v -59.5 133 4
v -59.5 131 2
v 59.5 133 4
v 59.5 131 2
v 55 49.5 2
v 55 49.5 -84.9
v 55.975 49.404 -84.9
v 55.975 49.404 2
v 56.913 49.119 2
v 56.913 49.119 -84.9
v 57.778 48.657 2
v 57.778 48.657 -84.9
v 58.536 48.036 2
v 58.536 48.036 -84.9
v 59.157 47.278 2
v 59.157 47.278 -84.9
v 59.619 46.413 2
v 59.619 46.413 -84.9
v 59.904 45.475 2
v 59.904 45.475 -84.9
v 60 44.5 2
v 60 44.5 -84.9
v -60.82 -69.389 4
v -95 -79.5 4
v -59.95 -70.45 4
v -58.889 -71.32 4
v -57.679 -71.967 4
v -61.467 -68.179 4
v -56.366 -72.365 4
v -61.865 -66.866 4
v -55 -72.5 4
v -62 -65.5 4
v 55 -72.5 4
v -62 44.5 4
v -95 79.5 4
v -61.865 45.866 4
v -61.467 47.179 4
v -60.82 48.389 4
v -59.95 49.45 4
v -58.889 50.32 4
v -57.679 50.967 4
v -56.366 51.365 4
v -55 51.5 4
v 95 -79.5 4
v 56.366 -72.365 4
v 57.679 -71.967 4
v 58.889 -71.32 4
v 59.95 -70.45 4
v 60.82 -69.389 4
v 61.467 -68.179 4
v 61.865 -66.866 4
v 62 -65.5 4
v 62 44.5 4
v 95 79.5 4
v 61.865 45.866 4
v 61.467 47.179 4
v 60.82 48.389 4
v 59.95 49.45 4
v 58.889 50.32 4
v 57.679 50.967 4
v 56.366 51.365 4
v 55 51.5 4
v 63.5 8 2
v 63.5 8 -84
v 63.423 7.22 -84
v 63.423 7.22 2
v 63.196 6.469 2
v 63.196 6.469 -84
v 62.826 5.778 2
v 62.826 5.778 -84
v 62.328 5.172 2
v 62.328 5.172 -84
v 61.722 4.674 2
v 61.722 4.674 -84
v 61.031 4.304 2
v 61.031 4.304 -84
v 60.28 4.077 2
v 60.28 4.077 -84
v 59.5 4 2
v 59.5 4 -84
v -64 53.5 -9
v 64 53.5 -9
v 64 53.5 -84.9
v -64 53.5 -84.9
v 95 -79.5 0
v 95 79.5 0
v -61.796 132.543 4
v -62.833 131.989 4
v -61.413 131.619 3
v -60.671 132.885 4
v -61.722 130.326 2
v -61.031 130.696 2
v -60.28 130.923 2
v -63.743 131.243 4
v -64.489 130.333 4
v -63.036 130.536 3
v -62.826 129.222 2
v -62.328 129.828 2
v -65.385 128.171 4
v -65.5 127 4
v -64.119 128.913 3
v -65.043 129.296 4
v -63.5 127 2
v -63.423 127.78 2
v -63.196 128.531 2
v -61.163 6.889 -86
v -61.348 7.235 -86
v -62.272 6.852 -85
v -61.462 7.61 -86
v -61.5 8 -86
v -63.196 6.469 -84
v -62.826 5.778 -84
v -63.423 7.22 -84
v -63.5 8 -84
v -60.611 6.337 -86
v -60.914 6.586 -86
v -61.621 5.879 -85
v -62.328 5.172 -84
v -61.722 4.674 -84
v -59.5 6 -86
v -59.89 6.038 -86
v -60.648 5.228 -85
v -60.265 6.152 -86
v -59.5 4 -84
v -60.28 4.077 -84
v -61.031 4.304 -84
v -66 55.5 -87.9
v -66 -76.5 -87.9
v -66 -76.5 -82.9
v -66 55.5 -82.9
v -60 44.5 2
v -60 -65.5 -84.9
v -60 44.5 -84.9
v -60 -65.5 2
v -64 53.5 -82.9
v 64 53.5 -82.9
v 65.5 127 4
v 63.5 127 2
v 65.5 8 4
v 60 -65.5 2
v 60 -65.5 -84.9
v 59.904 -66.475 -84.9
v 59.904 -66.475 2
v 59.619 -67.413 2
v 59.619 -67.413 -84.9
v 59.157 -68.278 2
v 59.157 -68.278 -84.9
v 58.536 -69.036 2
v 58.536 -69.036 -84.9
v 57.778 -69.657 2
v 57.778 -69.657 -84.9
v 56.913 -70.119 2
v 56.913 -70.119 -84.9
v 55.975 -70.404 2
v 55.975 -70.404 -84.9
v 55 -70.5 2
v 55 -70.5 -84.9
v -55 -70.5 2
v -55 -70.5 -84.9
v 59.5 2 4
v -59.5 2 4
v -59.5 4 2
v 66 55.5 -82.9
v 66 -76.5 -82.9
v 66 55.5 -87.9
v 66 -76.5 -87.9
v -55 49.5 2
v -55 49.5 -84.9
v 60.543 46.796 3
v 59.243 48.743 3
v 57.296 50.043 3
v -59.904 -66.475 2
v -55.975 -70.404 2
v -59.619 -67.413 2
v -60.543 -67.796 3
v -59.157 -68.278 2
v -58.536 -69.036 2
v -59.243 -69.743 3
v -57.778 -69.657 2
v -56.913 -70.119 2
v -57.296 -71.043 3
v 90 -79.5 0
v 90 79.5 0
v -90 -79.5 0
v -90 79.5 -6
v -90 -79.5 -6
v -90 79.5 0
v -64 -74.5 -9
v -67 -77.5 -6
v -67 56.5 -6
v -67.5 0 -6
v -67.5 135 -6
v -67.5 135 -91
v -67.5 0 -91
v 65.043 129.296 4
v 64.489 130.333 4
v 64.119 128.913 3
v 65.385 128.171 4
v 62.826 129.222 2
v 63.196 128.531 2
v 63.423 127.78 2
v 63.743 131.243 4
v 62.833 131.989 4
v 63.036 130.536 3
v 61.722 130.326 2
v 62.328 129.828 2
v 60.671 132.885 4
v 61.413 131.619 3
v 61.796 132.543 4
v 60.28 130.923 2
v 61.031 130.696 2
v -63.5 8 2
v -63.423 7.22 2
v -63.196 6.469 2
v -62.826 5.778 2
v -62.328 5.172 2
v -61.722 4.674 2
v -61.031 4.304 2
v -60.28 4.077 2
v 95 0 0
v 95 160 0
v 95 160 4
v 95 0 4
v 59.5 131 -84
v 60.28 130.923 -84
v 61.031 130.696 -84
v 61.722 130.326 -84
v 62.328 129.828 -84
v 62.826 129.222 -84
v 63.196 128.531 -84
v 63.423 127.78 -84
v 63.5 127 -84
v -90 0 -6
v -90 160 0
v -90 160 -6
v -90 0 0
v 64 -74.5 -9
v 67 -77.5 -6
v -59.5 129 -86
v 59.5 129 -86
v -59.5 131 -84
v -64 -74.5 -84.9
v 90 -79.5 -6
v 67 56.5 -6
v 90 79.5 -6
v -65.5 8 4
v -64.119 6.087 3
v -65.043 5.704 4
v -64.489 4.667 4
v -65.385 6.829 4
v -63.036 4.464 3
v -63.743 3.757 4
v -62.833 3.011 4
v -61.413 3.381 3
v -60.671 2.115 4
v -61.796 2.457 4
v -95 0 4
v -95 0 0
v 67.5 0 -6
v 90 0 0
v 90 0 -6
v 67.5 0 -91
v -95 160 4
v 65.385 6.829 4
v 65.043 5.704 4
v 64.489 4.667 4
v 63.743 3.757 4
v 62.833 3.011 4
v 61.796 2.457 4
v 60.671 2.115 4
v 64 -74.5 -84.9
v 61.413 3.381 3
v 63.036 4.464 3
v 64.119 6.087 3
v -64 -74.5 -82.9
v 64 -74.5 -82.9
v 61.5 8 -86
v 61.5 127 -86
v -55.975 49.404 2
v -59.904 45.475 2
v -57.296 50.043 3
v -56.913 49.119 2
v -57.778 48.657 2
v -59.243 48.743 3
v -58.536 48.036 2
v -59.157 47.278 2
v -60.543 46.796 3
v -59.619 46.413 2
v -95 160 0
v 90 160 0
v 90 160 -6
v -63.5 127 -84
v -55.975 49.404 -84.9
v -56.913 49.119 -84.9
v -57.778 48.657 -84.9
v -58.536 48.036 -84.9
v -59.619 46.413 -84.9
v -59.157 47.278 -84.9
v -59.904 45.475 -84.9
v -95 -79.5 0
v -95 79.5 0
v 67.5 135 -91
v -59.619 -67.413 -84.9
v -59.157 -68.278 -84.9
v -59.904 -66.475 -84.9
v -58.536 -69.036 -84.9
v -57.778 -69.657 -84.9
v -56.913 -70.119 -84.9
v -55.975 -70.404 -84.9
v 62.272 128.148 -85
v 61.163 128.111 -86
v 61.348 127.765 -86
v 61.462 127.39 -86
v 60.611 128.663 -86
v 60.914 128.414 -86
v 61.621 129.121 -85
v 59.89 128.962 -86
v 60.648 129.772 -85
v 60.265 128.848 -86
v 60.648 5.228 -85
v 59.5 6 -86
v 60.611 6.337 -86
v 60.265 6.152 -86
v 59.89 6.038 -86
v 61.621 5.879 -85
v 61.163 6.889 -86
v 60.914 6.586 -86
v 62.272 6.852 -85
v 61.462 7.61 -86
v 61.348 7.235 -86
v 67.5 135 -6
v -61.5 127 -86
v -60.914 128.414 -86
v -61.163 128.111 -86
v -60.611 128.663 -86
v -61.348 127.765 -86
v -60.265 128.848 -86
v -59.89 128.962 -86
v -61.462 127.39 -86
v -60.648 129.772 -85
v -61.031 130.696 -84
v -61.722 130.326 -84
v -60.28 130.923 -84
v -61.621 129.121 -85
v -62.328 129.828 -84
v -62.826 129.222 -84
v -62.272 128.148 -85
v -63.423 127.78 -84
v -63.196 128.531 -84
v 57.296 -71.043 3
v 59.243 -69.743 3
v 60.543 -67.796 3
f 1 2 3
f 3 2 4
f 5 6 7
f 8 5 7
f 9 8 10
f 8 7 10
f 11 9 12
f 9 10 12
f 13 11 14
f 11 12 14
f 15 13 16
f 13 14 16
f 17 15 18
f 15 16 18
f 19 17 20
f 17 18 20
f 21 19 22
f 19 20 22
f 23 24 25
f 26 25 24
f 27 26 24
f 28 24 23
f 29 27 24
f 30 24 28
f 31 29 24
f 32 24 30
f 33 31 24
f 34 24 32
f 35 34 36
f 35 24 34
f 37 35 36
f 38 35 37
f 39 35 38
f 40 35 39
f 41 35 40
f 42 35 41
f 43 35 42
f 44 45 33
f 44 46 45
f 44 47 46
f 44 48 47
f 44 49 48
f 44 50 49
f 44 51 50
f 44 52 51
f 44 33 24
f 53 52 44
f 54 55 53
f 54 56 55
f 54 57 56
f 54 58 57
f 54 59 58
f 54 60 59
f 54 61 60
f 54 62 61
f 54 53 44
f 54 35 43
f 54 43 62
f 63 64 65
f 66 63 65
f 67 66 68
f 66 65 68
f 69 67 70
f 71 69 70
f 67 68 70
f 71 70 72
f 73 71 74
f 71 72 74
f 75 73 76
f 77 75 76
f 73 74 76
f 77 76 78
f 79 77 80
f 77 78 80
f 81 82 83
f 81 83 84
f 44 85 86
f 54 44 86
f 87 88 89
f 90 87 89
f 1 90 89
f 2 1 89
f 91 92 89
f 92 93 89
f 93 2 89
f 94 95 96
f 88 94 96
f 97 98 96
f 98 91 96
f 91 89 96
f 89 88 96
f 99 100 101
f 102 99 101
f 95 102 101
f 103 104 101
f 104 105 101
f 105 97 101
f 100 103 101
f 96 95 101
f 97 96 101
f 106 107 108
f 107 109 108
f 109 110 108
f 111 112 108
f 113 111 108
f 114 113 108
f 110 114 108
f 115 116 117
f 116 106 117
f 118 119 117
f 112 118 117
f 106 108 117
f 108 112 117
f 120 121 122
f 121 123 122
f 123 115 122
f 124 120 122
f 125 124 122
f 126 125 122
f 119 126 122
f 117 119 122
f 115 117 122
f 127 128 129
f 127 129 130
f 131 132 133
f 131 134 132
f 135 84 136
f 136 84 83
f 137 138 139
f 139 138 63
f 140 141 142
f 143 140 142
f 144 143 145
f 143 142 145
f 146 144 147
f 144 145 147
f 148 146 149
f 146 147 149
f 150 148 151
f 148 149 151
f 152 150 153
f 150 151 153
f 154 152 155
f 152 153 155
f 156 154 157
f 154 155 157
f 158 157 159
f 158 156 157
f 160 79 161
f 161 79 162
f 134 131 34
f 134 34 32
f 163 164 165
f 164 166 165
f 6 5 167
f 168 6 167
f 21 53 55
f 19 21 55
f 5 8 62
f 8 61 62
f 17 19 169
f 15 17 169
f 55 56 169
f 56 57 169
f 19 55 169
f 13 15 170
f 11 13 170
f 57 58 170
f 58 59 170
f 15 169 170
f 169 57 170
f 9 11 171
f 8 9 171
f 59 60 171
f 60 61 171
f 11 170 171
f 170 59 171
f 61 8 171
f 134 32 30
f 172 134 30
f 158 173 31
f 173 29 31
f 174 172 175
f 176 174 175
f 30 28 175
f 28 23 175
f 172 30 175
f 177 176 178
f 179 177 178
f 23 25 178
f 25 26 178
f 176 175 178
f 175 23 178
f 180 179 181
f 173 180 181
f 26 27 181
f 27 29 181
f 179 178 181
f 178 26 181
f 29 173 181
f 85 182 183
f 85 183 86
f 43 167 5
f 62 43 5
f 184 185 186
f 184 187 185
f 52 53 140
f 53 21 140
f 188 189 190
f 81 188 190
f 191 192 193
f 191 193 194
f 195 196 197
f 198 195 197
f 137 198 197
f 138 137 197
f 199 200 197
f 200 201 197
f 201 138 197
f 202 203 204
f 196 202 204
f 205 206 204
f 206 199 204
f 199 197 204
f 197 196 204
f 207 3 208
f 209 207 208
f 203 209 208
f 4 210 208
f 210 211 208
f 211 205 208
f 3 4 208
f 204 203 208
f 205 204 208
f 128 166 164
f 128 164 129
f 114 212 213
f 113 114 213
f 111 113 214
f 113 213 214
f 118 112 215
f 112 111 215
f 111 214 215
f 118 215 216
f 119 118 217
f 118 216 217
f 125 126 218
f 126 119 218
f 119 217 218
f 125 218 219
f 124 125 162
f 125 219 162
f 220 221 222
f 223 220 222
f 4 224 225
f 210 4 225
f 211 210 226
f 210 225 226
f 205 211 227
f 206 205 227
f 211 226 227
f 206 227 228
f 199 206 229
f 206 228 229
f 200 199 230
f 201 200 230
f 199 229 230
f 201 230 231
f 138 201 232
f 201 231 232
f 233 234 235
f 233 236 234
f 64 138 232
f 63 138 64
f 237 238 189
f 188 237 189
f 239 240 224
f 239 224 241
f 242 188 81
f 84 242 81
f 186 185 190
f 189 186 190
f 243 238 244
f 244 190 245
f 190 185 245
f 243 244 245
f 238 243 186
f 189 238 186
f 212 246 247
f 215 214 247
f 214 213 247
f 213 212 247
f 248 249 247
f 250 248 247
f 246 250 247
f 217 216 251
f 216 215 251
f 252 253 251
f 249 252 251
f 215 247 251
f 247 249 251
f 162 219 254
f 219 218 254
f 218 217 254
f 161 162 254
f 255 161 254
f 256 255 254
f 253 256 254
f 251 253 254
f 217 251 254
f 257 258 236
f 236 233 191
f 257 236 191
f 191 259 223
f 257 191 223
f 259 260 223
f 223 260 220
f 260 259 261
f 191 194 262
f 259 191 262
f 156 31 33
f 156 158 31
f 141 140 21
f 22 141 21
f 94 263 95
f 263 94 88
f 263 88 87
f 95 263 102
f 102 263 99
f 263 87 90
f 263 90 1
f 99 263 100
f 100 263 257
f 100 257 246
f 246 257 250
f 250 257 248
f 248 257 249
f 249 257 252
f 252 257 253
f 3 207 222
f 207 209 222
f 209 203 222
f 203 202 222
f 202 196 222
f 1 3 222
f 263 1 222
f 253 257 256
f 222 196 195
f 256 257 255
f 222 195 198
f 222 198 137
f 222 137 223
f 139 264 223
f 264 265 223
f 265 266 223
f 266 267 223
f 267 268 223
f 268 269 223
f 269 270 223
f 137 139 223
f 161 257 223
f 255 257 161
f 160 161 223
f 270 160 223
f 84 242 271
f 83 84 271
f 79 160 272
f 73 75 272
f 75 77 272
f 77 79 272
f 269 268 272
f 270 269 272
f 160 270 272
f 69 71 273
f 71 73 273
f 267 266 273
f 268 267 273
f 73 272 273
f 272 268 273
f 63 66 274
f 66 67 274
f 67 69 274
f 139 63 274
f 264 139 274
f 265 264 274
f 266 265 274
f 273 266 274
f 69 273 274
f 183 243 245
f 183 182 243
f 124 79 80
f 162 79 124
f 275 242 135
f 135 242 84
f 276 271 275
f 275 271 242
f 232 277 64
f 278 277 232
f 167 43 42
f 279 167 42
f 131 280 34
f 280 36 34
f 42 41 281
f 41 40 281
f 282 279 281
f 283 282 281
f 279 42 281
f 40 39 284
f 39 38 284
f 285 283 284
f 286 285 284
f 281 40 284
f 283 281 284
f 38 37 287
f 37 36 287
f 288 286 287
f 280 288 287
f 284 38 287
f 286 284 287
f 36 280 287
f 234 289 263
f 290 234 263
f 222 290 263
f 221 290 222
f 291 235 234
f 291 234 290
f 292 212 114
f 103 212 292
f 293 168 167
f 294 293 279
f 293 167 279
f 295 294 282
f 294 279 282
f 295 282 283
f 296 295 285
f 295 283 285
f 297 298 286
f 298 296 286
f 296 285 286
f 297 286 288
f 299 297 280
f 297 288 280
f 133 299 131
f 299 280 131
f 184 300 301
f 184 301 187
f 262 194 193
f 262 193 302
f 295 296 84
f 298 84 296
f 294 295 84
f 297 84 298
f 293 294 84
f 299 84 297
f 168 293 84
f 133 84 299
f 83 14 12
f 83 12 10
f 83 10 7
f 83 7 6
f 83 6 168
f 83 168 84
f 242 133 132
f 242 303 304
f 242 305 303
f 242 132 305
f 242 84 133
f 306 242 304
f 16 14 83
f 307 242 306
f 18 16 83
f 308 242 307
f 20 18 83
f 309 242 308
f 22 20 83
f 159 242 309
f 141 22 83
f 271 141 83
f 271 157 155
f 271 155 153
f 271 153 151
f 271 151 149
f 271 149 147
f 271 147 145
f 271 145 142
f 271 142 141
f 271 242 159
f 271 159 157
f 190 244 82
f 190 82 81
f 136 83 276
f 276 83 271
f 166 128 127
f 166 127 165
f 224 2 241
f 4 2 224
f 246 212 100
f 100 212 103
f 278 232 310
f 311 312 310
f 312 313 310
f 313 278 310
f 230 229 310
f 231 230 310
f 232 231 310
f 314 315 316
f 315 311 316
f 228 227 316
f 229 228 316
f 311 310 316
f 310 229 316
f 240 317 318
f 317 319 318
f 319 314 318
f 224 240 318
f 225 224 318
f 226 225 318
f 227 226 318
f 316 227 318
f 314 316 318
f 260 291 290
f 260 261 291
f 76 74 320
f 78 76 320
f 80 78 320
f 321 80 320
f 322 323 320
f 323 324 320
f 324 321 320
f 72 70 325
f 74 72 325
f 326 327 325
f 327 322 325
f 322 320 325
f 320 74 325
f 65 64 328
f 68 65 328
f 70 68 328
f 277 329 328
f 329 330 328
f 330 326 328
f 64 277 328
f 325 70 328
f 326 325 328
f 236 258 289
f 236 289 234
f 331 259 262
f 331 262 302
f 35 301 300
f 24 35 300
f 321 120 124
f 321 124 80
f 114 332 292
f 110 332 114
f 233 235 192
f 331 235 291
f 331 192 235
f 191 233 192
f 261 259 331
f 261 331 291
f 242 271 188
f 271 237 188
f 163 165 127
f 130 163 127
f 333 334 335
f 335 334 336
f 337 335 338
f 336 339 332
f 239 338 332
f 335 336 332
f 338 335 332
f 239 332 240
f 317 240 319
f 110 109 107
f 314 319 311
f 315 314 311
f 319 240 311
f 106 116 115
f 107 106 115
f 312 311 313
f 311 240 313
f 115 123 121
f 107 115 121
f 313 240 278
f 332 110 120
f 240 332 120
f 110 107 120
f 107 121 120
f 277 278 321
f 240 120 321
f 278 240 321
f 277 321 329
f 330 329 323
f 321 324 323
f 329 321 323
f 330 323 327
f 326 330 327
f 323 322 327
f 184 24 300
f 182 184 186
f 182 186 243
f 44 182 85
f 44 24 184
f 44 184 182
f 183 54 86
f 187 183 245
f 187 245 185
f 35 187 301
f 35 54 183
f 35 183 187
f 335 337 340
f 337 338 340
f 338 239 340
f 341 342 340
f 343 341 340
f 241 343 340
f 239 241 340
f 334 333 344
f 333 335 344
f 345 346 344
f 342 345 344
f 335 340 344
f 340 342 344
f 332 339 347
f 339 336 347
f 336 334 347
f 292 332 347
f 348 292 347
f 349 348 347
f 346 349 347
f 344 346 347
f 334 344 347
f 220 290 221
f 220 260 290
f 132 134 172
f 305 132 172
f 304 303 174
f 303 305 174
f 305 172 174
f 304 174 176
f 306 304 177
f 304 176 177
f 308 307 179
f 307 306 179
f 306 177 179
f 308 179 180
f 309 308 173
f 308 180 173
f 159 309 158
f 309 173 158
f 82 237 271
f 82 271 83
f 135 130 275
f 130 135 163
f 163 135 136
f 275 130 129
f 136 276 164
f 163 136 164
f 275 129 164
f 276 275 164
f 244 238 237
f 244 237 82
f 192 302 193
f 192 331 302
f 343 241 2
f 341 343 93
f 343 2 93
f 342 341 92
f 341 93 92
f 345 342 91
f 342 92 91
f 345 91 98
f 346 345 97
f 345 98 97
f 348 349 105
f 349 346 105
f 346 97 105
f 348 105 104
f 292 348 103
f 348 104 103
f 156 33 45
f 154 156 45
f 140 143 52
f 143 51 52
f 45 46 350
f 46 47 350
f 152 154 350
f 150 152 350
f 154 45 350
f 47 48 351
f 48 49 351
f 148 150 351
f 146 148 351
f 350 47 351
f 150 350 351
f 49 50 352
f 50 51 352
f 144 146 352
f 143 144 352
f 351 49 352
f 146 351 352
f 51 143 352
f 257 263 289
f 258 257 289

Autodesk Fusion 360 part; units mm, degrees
sketch "Frame" plane through (0, 0, 0) normal (0, 0, 1) x (1, 0, 0)
  line L0 (95, 79.5) -> (-95, 79.5)
  line L1 (-95, 79.5) -> (-95, -79.5)
  line L2 (-95, -79.5) -> (95, -79.5)
  line L3 (95, -79.5) -> (95, 79.5)
  line L4 (95, 79.5) -> (-95, -79.5) construction
  line L5 (-95, 79.5) -> (95, -79.5) construction
  line L6 (-90, -79.5) -> (90, -79.5)
  line L7 (90, -79.5) -> (90, 79.5)
  line L8 (90, 79.5) -> (-90, 79.5)
  line L9 (-90, 79.5) -> (-90, -79.5)
  line L10 (-90, -79.5) -> (90, 79.5) construction
  line L11 (90, -79.5) -> (-90, 79.5) construction
  line L12 (86, -75.5) -> (86, 75.5)
  line L13 (86, 75.5) -> (-86, 75.5)
  line L14 (-86, 75.5) -> (-86, -75.5)
  line L15 (-86, -75.5) -> (86, -75.5)
  dimension "d1" = 190
  dimension "d2" = 159
  dimension "d3" = 180
  dimension "d4" = -4
extrude "Extrude1" add sketch "Frame" against normal blind 6 contours L0 L2 L6 L7 L8 L9 makes body 1
extrude "Extrude2" add sketch "Frame" along normal blind 4 bodies 1
sketch "Jar Hole" plane through (0, 0, 4) normal (0, 0, -1) x (1, 0, 0)
  line L0 (-86, 75.5) -> (86, 75.5)
  line L1 (86, 75.5) -> (86, -75.5)
  line L2 (86, -75.5) -> (-86, -75.5)
  line L3 (-90, 79.5) -> (-90, -79.5)
  line L4 (-90, -79.5) -> (90, -79.5)
  line L5 (90, -79.5) -> (90, 79.5)
  line L6 (90, 79.5) -> (-90, 79.5)
  line L7 (60, 70.5) -> (60, -49.5)
  line L8 (60, -49.5) -> (-60, -49.5)
  line L9 (86, 75.5) -> (46, 75.5)
  line L10 (86, 21.5) -> (86, 75.5)
  line L11 (86, -56.5) -> (86, 9.1429)
  line L12 (60, 70.5) -> (-60, 70.5)
  line L13 (-60, 70.5) -> (-60, -49.5)
  line L14 (-86, 75.5) -> (-86, -75.5)
  line L15 (86, 75.5) -> (-86, 75.5)
  line L16 (64, 74.5) -> (64, -53.5)
  line L17 (64, -53.5) -> (-64, -53.5)
  line L18 (-64, 74.5) -> (-64, -53.5)
  line L19 (64, 74.5) -> (-64, 74.5)
  line L20 (86, 75.5) -> (-86, 75.5)
  line L21 (-86, 75.5) -> (-86, -75.5)
  line L22 (-86, -75.5) -> (86, -75.5)
  line L23 (86, -75.5) -> (86, 75.5)
  line L24 (95, -79.5) -> (-95, -79.5)
  line L25 (-95, -79.5) -> (-95, 79.5)
  line L26 (-95, 79.5) -> (95, 79.5)
  line L27 (95, 79.5) -> (95, -79.5)
  dimension "d11" = 40
  dimension "d12" = 54
  dimension "d25" = 120
  dimension "d26" = 120
  dimension "d35" = -4
  dimension "d36" = 22
  dimension "d37" = 1
extrude "Extrude3" add sketch "Jar Hole" along normal blind 10 contours L0 L1 L2 L9 L10 L11 L14 L15 L20 L21 L22 L23 | L16 L17 L18 L19 bodies 1
extrude "Extrude8" add sketch "Jar Hole" along normal blind 88.9 contours L16 L17 L18 L19 bodies 1
sketch "Sketch Bottom Lid" plane through (0, 0, -84.9) normal (0, 0, -1) x (1, 0, 0)
  line L0 (-60, 70.5) -> (60, 70.5)
  line L1 (60, 70.5) -> (60, -49.5)
  line L2 (60, -49.5) -> (-60, -49.5)
  line L3 (-60, -49.5) -> (-60, 70.5)
  line L4 (64, -53.5) -> (64, 74.5)
  line L5 (64, 74.5) -> (-64, 74.5)
  line L6 (-64, 74.5) -> (-64, -53.5)
  line L7 (-64, -53.5) -> (64, -53.5)
  line L8 (64, 74.5) -> (64, -53.5)
  line L9 (64, -53.5) -> (-64, -53.5)
  line L10 (-64, 74.5) -> (-64, -53.5)
  line L11 (64, 74.5) -> (-64, 74.5)
  line L12 (-66, 76.5) -> (-66, -55.5)
  line L13 (66, -55.5) -> (-66, -55.5)
  line L14 (66, 76.5) -> (66, -55.5)
  line L15 (66, 76.5) -> (-66, 76.5)
  dimension "d44" = -2
extrude "Extrude9" add sketch "Sketch Bottom Lid" against normal blind 2 separate body contours L12 L13 L14 L15 makes body 2
extrude "Extrude10" add sketch "Sketch Bottom Lid" along normal blind 3 contours L0 L1 L2 L3 | L4 L5 L6 L7 L8 L9 L10 L11 | L12 L13 L14 L15 bodies 2
fillet "Fillet2" radius 5 4 edges at (-60, 49.5, -40.45) (60, -70.5, -40.45) (-60, -70.5, -40.45) (60, 49.5, -40.45) on bodies 1
chamfer "Chamfer1" distance 2 angle 45 8 edges at (60, -10.5, 4) (58.5355, 48.0355, 4) (0, 49.5, 4) (-58.5355, 48.0355, 4) (-60, -10.5, 4) (-58.5355, -69.0355, 4) (0, -70.5, 4) (58.5355, -69.0355, 4) on bodies 1
chamfer "Chamfer2" distance 3 angle 45 4 edges at (0, -74.5, -6) (-64, -10.5, -6) (0, 53.5, -6) (64, -10.5, -6) on bodies 1
sketch "Sketch1" plane through (0, 0, 0) normal (0, 1, 0) x (1, 0, 0) in component "v2"
  line L0 (-95, -4) -> (95, -4)
  line L1 (-90, 0) -> (-90, 6)
  line L2 (-90, 6) -> (90, 6)
  line L3 (90, 6) -> (90, 0)
  line L4 (90, 0) -> (95, 0)
  line L5 (95, 0) -> (95, -4)
  line L6 (95, -4) -> (-95, -4)
  line L7 (-95, -4) -> (-95, 0)
  line L8 (-95, 0) -> (-90, 0)
extrude "Extrude1'" add sketch "Sketch1" along normal blind 160 separate body makes body 3 in component "v2"
sketch "Sketch2" plane through (0, 0, 4) normal (0, 0, 1) x (-1, 0, 0) in component "v2"
  line L0 (95, 0) -> (-95, 0)
  line L1 (-95, 0) -> (-95, -160)
  line L2 (-95, -160) -> (95, -160)
  line L3 (95, -160) -> (95, 0)
  line L4 (0, 0) -> (0, -67.5) construction
  line L5 (-63.5, -4) -> (63.5, -4)
  line L6 (63.5, -4) -> (63.5, -131)
  line L7 (63.5, -131) -> (-63.5, -131)
  line L8 (-63.5, -131) -> (-63.5, -4)
  line L9 (-63.5, -4) -> (63.5, -131) construction
  line L10 (63.5, -4) -> (-63.5, -131) construction
  line L11 (-67.5, -135) -> (67.5, -135)
  line L12 (67.5, -135) -> (67.5, 0)
  line L13 (67.5, 0) -> (-67.5, 0)
  line L14 (-67.5, 0) -> (-67.5, -135)
  line L15 (-67.5, -135) -> (67.5, 0) construction
  line L16 (67.5, -135) -> (-67.5, 0) construction
  point P0 (0, -67.5)
  point P1 (0, -67.5)
  dimension "d57" = 127
  dimension "d59" = 4
  dimension "d60" = 135
extrude "Extrude2'" cut sketch "Sketch2" against normal through all contours L5 L6 L7 L8 bodies 3 in component "v2"
extrude "Extrude3'" add sketch "Sketch2" against normal blind 90 contours L0 L11 L12 L13 L14 bodies 3 in component "v2"
sketch "Sketch3" plane through (0, 0, -86) normal (0, 0, -1) x (1, 0, 0) in component "v2"
  line L0 (63.5, -131) -> (-63.5, -131)
  line L1 (-63.5, -131) -> (-63.5, -4)
  line L2 (-63.5, -4) -> (63.5, -4)
  line L3 (63.5, -4) -> (63.5, -131)
  line L4 (67.5, -135) -> (67.5, 0)
  line L5 (67.5, 0) -> (-67.5, 0)
  line L6 (-67.5, 0) -> (-67.5, -135)
  line L7 (-67.5, -135) -> (67.5, -135)
  line L8 (-67.5, -135) -> (-67.5, 0)
  line L9 (67.5, -135) -> (-67.5, -135)
  line L10 (67.5, 0) -> (67.5, -135)
  line L11 (-67.5, 0) -> (67.5, 0)
extrude "Extrude4" add sketch "Sketch3" along normal blind 5 contours L0 L1 L2 L3 | L4 L5 L6 L7 L8 L9 L10 L11 bodies 3 in component "v2"
fillet "Fillet1" radius 4 4 edges at (63.5, 131, -41) (-63.5, 131, -41) (63.5, 4, -41) (-63.5, 4, -41) on bodies 3 in component "v2"
chamfer "Chamfer1'" distance 2 angle 45 4 edges at (-63.5, 67.5, 4) (0, 4, 4) (63.5, 67.5, 4) (0, 131, 4) on bodies 3 in component "v2"
chamfer "Chamfer2'" distance 2 angle 45 8 edges at (63.5, 67.5, -86) (62.3284, 129.8284, -86) (0, 131, -86) (-62.3284, 129.8284, -86) (-63.5, 67.5, -86) (-62.3284, 5.1716, -86) (0, 4, -86) (62.3284, 5.1716, -86) on bodies 3 in component "v2"
component "v2" placed x (1, 0, 0) y (0, 1, 0) z (0, 0, 1) at (0, 0, 0)
